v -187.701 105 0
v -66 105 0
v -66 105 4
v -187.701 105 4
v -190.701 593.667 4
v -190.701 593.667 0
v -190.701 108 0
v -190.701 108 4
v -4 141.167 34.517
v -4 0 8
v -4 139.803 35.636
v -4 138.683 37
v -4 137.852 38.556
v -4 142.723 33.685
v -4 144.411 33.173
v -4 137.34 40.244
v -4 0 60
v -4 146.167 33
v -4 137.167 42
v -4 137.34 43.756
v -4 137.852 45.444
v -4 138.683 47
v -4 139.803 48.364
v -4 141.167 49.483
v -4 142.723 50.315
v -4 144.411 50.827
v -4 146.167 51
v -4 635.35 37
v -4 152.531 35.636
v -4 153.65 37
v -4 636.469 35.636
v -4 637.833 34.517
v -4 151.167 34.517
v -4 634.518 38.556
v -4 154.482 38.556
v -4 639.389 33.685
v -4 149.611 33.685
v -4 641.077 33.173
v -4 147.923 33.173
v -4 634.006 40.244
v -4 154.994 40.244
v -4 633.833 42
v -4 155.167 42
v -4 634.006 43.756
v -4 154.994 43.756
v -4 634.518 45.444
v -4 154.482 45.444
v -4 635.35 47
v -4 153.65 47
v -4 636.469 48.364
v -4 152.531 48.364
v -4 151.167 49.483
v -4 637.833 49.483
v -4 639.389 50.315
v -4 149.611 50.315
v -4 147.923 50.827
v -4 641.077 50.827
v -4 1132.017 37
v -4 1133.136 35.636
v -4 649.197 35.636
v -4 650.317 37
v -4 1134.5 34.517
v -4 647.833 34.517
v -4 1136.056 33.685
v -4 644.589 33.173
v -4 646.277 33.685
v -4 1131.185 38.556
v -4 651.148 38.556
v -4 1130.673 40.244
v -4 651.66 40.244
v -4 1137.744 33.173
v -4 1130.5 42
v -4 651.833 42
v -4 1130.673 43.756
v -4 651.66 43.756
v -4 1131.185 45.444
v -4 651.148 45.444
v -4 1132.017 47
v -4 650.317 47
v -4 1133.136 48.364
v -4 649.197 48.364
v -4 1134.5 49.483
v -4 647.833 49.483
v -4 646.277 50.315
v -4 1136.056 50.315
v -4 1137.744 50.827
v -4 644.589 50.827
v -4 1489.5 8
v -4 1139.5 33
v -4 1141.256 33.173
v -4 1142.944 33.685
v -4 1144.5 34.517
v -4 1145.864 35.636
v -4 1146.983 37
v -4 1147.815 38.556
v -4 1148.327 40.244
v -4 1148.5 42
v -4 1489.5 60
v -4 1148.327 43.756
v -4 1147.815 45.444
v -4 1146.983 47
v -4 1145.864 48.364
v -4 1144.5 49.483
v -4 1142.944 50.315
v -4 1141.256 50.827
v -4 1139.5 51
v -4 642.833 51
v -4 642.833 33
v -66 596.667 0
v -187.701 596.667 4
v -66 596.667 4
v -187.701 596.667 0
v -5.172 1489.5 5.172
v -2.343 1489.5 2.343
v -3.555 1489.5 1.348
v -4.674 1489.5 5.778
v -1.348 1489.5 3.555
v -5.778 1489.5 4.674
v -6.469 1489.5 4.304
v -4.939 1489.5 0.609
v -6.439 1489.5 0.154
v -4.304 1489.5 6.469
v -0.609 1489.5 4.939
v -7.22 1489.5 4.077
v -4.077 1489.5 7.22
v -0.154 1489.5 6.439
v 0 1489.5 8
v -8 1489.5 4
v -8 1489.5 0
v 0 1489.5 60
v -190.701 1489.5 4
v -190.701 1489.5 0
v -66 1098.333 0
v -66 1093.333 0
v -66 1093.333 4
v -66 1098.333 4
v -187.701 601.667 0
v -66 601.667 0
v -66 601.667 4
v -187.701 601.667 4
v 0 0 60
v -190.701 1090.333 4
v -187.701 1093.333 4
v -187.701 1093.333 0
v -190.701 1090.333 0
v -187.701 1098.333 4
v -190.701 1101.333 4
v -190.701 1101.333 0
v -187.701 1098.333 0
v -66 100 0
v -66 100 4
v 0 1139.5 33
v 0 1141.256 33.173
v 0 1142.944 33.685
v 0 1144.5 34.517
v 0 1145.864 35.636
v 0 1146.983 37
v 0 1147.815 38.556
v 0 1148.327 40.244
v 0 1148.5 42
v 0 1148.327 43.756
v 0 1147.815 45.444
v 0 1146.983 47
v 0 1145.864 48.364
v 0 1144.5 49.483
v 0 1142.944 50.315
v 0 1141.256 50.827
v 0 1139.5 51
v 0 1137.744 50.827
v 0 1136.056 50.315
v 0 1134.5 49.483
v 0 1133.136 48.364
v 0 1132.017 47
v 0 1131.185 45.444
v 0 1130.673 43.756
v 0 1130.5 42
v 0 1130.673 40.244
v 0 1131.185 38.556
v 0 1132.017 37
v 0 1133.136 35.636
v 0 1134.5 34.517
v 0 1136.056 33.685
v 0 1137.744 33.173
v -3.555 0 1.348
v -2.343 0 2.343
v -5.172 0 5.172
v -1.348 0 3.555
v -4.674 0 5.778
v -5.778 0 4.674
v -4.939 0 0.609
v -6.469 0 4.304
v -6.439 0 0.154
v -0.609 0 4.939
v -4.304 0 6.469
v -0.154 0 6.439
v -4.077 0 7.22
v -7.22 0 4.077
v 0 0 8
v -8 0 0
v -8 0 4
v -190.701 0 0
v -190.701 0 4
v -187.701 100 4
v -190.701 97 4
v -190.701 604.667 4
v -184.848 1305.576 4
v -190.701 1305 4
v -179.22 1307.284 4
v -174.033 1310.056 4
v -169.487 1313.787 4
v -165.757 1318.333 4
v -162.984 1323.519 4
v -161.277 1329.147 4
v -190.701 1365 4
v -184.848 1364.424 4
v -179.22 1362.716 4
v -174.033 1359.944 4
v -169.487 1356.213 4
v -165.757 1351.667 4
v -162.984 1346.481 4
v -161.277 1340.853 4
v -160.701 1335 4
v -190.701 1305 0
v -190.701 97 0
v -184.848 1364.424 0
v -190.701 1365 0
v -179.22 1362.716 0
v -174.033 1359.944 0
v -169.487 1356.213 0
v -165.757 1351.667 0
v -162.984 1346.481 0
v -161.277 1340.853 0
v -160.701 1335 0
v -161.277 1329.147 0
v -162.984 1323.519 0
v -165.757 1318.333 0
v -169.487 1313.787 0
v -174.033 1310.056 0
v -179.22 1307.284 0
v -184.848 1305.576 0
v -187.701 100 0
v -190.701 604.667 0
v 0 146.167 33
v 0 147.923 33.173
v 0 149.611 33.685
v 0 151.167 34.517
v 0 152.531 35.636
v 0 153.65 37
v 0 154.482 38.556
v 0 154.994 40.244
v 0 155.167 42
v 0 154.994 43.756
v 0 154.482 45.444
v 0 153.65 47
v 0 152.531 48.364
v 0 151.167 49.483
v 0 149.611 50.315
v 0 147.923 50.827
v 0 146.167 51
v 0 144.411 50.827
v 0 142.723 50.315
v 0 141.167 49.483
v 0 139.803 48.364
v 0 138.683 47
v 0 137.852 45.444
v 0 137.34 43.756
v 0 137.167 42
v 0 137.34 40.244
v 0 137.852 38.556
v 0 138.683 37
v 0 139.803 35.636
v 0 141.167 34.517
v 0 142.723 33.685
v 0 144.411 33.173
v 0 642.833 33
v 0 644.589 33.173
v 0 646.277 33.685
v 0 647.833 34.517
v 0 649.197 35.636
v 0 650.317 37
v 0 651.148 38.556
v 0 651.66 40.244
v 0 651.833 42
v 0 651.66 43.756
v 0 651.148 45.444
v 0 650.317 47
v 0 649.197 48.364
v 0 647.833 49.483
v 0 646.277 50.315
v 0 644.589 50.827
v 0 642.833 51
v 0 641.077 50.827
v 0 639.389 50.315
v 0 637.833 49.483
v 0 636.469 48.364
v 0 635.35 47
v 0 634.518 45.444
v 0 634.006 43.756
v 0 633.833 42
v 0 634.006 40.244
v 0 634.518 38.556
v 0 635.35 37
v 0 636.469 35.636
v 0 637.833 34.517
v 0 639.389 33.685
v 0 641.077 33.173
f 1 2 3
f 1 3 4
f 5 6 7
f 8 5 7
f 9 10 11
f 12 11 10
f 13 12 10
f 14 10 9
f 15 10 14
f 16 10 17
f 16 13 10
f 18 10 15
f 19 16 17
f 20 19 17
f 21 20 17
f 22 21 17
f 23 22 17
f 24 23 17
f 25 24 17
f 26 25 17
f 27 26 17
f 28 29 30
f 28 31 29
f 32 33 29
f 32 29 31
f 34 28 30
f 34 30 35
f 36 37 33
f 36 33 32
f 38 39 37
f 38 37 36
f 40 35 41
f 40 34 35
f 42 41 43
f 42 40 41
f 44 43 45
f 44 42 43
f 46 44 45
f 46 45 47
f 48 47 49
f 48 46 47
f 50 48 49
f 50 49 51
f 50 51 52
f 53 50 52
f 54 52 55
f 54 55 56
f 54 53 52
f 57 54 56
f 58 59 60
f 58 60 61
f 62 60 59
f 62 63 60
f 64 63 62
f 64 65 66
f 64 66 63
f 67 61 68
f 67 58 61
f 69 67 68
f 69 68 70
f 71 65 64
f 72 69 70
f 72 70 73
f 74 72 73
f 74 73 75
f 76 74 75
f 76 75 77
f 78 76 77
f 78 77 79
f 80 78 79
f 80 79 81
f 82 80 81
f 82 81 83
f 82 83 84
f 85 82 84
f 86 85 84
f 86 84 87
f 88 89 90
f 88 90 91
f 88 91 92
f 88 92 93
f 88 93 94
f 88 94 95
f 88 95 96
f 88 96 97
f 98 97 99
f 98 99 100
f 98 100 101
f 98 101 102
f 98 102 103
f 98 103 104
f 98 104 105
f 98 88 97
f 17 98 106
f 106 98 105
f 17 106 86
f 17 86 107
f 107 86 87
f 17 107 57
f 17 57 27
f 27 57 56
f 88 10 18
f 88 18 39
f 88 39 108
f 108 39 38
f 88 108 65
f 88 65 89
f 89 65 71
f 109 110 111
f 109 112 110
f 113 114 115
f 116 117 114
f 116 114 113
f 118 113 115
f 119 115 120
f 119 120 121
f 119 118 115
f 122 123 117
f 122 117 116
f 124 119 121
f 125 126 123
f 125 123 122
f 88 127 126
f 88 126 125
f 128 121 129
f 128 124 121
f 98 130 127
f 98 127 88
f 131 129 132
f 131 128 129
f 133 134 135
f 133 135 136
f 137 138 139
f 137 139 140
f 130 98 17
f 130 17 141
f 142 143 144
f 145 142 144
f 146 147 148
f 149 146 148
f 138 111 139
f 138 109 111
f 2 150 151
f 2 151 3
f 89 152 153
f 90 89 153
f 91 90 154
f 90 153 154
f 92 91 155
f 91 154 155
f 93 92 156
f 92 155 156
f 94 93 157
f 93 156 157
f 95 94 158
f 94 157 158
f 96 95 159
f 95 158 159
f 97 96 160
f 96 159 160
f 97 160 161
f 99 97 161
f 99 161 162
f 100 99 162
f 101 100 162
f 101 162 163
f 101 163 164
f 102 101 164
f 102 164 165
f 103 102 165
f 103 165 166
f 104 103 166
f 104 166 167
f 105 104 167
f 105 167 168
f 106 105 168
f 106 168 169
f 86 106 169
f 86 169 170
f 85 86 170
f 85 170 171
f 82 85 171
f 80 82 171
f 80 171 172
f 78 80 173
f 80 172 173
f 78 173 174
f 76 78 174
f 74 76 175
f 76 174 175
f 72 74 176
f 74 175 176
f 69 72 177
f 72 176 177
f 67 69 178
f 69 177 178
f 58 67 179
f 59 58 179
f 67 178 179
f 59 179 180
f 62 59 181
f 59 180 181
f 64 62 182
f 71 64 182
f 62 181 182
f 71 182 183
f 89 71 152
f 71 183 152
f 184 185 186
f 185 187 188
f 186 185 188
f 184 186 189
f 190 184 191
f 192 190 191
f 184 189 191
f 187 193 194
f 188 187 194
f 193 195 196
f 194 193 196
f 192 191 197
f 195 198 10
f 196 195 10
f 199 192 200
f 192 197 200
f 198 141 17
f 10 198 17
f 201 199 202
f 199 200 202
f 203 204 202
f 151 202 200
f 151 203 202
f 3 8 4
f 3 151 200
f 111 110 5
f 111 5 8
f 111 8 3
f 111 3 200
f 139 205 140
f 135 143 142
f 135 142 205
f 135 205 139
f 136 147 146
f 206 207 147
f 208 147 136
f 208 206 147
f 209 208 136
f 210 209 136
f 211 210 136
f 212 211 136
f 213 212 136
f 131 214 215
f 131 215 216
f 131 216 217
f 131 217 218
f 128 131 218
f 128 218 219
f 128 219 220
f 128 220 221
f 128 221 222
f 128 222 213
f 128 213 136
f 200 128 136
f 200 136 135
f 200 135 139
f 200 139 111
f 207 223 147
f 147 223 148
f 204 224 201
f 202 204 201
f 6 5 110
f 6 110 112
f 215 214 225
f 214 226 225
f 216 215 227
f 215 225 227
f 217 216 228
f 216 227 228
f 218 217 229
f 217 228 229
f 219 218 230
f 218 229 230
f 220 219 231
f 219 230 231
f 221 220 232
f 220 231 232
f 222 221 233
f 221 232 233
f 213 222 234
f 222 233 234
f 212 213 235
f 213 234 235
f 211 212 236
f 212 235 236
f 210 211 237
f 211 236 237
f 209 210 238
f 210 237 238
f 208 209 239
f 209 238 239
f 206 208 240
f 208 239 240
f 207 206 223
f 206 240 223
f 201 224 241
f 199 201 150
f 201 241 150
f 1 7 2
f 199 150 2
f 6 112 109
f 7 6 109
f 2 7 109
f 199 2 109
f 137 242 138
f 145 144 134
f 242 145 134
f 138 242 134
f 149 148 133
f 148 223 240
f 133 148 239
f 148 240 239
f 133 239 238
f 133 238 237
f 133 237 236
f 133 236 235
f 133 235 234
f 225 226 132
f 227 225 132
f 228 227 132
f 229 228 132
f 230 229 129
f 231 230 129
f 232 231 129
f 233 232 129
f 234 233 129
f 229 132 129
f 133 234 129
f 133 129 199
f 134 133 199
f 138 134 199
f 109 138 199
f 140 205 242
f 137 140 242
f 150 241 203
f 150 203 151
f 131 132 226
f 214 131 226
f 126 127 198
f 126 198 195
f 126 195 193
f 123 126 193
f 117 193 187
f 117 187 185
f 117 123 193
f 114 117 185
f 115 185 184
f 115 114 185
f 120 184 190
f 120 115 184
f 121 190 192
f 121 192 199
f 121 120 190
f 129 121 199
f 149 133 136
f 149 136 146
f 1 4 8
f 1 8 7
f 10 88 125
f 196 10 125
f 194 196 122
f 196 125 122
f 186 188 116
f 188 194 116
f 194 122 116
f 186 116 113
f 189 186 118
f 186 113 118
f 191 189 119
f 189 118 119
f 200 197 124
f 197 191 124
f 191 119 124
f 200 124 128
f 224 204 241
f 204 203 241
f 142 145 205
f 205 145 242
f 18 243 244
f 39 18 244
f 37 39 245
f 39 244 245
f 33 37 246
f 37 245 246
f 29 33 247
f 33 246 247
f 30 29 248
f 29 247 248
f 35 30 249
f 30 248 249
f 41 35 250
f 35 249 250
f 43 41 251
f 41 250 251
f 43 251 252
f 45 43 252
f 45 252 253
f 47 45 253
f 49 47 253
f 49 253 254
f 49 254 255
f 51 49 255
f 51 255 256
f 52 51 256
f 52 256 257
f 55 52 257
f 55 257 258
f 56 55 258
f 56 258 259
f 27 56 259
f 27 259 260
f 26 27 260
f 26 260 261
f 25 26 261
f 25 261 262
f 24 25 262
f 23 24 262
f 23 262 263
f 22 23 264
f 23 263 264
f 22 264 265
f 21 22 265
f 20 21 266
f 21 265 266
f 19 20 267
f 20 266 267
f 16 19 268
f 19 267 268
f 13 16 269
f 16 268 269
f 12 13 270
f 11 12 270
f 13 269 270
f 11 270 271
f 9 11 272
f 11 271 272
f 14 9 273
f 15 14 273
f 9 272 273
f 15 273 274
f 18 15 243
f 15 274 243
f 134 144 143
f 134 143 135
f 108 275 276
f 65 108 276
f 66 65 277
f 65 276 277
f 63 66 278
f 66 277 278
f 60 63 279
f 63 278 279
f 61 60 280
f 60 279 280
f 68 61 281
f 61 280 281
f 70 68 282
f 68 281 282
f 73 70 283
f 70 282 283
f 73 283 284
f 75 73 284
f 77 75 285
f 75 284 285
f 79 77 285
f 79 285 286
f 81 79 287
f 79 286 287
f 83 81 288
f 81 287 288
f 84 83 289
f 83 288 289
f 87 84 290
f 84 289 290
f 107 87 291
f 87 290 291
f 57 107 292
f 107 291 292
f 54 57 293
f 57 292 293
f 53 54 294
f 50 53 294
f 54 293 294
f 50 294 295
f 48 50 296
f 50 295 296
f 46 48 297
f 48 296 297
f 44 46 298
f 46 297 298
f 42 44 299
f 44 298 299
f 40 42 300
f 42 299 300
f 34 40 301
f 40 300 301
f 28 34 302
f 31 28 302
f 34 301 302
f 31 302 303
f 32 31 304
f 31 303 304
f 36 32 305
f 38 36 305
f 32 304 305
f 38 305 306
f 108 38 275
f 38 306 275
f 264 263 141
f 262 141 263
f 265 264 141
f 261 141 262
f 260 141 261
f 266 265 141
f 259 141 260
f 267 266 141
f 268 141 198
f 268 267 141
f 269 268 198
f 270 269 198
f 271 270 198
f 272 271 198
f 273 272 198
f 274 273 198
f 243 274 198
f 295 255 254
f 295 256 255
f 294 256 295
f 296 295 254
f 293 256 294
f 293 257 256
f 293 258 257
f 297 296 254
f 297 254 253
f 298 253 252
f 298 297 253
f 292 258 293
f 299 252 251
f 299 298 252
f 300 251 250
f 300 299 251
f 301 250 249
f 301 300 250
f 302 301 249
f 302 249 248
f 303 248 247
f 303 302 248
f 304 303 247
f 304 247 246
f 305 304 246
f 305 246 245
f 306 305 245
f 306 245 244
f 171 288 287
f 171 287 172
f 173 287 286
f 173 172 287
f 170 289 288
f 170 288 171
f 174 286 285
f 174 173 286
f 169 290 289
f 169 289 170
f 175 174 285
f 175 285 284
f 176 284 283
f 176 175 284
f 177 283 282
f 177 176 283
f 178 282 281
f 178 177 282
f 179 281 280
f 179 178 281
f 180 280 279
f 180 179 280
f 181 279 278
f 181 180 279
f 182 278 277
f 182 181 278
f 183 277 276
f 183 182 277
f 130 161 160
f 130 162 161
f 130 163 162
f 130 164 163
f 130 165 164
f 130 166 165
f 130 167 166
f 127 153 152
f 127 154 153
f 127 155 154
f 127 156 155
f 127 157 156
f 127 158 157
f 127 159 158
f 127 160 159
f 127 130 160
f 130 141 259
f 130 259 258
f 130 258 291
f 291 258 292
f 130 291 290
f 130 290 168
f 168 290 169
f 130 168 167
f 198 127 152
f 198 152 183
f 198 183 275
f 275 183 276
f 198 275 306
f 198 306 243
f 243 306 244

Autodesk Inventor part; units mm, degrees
ref_plane "YZ Plane" through (0, 0, 0) normal (1, 0, 0) x (0, 1, 0)
ref_plane "XZ Plane" through (0, 0, 0) normal (0, 1, 0) x (-1, 0, 0)
ref_plane "XY Plane" through (0, 0, 0) normal (0, 0, 1) x (1, 0, 0)
sketch "Sketch1" plane through (0, 0, 0) normal (0, 0, 1) x (1, 0, 0)
  line L0 (0, 1489.5) -> (-190.7006, 1489.5)
  line L1 (-190.7006, 1489.5) -> (-190.7006, 0)
  line L2 (-190.7006, 0) -> (0, 0)
  line L3 (0, 0) -> (0, 1489.5)
  line L4 (-190.7006, 100) -> (-66, 100)
  line L5 (-66, 100) -> (-66, 105)
  line L6 (-66, 105) -> (-190.7006, 105)
  line L7 (-190.7006, 105) -> (-190.7006, 100)
  line L8 (-190.7006, 596.6667) -> (-66, 596.6667)
  line L9 (-66, 596.6667) -> (-66, 601.6667)
  line L10 (-66, 601.6667) -> (-190.7006, 601.6667)
  line L11 (-190.7006, 601.6667) -> (-190.7006, 596.6667)
  line L12 (-190.7006, 1093.3333) -> (-66, 1093.3333)
  line L13 (-66, 1093.3333) -> (-66, 1098.3333)
  line L14 (-66, 1098.3333) -> (-190.7006, 1098.3333)
  line L15 (-190.7006, 1098.3333) -> (-190.7006, 1093.3333)
  circle A0 centre (-190.7006, 1335) radius 30
  point P0 (-190.7006, 1098.3333)
  point P1 (-190.7006, 1093.3333)
  point P2 (-190.7006, 601.6667)
  point P3 (-190.7006, 596.6667)
  point P4 (-190.7006, 1365)
  point P5 (-190.7006, 1305)
  dimension "d0" = 1489.5
  dimension "d1" = 190.7006
  dimension "d2" = 5
  dimension "d4" = 100
  dimension "d7" = 496.6667
  dimension "d23" = 66
  dimension "d29" = 60
  dimension "d30" = 1335
extrude "Plate1" add sketch "Sketch1" along normal blind 4 contours L3 L2 L1 L4 L5 L6 L8 L9 L10 L12 L13 L14 A0 L0
sketch "Sketch2" plane through (-4, 1489.5, 0) normal (1, 0, 0) x (0, 1, 0)
  line L0 (-1489.5, 0) -> (0, 0)
  line L1 (0, 0) -> (0, 60)
  line L2 (0, 60) -> (-1489.5, 60)
  line L3 (-1489.5, 60) -> (-1489.5, 0)
edge flange "Flange1" height 60 angle 90 thickness 4 bend radius 4 thickness toward (1, 0, 0) relief tear relief width 4 relief depth 2 edges at (0, 744.75, 4) wall of the first edge with corners at (-4, 0, 0) (-4, 1489.5, 0) (-4, 1489.5, 60) (-4, 0, 60)
bend "Bend1"
corner "Corner1"
chamfer "Corner Chamfer1" distance 3 angle 45 6 edges at (-190.7006, 100, 2) (-190.7006, 105, 2) (-190.7006, 596.6667, 2) (-190.7006, 601.6667, 2) (-190.7006, 1098.3333, 2) (-190.7006, 1093.3333, 2)
sketch "Sketch4" plane through (0, 0, 60) normal (1, 0, 0) x (0, 0, -1)
  line L0 (52, 0) -> (52, 1489.5) construction
  line L1 (0, 1489.5) -> (52, 1489.5) construction
  line L2 (0, 0) -> (0, 1489.5) construction
  line L3 (52, 0) -> (0, 0) projected
  circle A0 centre (18, 1139.5) radius 9
  circle A1 centre (18, 642.8333) radius 9
  circle A2 centre (18, 146.1667) radius 9
  point P0 (60, 0)
  dimension "d31" = 18
  dimension "d32" = 18
  dimension "d33" = 350
  dimension "d36" = 496.6667
extrude "Cut1" cut sketch "Sketch4" against normal blind 4
equation "\"d0\" = Стрингер_длина"
equation "\"d1\" = стрингер_глубина_1"
equation "\"d2\" = паз_под_стрингер_толщина"
equation "\"d7\" = Шаг_шпангоутов"
equation "\"d23\" = паз_под_стрингер_глубина - Thickness"
equation "\"d29\" = 2 * радиус_выреза_под_сварку"
equation "\"d36\" = Шаг_шпангоутов"
equation "\"d41\" = Thickness"
equation "\"d12\" = Thickness"
equation "\"d13\" = BendReliefWidth"
equation "\"d14\" = BendReliefDepth"
equation "\"d15\" = MinimumRemnant"
equation "\"d16\" = TransitionRadius"
equation "\"d17\" = ребро_усилителей"
equation "\"d19\" = BendRadius"
equation "\"d20\" = CornerReliefSize"
equation "\"d21\" = GapSize"
equation "\"d22\" = JacobiRadiusSize"
equation "\"BendRadius\" = Thickness"
equation "\"BendReliefWidth\" = Thickness"
equation "\"BendReliefDepth\" = 0.5 * Thickness"
equation "\"CornerReliefSize\" = 4 * Thickness"
equation "\"MinimumRemnant\" = 2 * Thickness"
equation "\"TransitionRadius\" = BendRadius"
equation "\"JacobiRadiusSize\" = BendRadius"
equation "\"GapSize\" = Thickness"
equation "\"Стрингер_длина\" = 1489.5"
equation "\"стрингер_глубина_1\" = 190.700557"
equation "\"паз_под_стрингер_толщина\" = 5"
equation "\"Шаг_шпангоутов\" = 496.666667"
equation "\"паз_под_стрингер_глубина\" = 70"
equation "\"Thickness\" = 4"
equation "\"радиус_выреза_под_сварку\" = 30"
equation "\"ребро_усилителей\" = 60"
properties part number "GBK 0102 stringer 1" material "Steel"
